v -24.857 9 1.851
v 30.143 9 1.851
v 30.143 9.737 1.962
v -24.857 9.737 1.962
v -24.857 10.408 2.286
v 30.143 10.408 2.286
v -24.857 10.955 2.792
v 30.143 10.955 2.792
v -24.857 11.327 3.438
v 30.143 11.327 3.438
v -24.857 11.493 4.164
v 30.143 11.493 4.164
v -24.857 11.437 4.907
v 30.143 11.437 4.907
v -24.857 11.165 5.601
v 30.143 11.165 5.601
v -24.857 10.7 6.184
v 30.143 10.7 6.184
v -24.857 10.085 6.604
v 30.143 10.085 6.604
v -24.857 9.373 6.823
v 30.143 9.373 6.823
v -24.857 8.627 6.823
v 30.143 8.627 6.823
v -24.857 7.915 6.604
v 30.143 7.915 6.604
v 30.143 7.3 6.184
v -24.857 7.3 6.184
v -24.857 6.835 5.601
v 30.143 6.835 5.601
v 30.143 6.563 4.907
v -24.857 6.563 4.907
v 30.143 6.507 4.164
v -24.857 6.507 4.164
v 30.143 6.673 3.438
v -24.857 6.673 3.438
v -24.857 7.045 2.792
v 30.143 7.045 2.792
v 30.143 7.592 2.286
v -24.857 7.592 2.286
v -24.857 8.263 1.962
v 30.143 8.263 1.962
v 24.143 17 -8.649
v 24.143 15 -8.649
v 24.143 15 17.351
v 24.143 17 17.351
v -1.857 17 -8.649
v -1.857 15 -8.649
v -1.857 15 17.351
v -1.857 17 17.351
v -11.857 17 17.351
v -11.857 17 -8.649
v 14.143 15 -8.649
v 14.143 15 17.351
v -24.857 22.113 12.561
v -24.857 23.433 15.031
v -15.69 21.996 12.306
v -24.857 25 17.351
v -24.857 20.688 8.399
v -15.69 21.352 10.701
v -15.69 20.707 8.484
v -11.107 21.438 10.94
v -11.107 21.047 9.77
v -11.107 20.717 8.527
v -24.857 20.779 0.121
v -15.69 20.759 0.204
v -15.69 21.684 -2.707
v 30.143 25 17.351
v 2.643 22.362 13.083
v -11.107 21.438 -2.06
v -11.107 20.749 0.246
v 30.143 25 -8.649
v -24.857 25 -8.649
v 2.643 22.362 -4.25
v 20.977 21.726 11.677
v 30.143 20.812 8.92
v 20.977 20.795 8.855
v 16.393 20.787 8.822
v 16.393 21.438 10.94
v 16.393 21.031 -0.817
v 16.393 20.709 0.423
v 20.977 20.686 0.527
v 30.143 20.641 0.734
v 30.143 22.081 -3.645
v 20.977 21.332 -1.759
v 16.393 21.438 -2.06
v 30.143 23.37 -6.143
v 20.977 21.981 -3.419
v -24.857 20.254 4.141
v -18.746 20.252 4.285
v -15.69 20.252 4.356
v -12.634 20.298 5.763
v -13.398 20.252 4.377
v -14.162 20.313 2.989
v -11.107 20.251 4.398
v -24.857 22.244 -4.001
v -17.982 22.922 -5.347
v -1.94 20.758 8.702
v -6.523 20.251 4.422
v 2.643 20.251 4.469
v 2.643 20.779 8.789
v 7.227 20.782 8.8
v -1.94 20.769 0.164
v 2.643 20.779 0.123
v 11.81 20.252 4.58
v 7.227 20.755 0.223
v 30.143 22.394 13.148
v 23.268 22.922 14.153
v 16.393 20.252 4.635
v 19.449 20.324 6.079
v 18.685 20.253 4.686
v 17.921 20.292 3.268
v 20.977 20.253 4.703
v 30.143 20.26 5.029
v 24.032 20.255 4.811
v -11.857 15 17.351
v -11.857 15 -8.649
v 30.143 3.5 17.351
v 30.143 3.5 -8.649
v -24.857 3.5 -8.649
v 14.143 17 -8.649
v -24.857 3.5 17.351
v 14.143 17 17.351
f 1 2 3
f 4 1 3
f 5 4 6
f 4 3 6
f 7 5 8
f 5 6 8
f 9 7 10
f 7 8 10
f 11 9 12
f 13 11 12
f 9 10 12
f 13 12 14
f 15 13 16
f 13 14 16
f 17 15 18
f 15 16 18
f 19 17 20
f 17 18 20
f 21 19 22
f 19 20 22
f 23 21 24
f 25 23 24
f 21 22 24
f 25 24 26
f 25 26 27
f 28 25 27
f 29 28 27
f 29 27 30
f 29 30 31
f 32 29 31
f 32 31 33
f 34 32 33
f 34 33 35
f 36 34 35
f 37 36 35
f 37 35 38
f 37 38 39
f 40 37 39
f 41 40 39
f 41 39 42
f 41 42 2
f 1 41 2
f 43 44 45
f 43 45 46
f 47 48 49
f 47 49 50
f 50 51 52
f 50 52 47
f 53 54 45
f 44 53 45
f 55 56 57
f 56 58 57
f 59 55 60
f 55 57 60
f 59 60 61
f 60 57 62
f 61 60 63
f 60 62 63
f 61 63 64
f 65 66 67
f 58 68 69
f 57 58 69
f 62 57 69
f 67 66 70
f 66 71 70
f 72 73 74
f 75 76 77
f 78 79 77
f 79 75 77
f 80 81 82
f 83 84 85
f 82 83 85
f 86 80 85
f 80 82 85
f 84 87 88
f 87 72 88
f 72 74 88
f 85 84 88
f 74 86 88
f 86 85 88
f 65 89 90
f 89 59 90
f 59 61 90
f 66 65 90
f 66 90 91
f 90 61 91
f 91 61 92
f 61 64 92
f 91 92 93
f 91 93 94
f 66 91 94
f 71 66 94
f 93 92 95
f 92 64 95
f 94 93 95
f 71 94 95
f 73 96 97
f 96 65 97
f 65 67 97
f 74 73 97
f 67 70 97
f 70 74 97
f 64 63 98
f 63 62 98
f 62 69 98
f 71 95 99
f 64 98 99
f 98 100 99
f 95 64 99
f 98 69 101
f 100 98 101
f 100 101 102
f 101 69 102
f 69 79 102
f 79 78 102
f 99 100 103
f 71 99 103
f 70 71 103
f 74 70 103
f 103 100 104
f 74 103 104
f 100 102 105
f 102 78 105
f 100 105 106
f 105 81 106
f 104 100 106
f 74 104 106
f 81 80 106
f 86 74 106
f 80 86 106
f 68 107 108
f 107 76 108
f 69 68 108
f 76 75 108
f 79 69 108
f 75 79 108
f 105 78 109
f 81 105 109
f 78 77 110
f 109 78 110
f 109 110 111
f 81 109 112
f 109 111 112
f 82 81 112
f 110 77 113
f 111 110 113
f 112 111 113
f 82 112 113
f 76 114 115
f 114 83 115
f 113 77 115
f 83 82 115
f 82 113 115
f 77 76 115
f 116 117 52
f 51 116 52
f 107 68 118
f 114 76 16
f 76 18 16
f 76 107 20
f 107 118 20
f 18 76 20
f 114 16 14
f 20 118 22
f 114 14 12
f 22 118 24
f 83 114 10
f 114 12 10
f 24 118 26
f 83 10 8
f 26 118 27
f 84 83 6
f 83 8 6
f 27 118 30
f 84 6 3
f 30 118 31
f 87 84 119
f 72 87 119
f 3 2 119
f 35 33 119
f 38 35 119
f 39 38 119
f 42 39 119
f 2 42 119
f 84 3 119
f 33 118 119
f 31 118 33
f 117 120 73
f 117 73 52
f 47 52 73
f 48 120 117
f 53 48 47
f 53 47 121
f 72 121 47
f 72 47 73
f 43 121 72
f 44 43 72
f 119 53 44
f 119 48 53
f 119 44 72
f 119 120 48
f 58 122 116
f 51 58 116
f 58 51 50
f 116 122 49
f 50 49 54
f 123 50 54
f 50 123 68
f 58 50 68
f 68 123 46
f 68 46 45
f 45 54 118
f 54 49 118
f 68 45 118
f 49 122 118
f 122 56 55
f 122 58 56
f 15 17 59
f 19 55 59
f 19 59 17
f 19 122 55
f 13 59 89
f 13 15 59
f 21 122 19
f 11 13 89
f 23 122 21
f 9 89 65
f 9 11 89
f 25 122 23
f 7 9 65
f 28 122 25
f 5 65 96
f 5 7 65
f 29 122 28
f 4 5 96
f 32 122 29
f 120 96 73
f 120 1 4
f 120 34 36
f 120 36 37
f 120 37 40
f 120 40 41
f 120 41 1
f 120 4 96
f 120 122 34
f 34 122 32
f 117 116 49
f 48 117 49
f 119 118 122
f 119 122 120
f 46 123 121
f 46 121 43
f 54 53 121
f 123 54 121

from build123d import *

# Parameters (mm, degrees)
ESQUISSE1_W             = 55
ESQUISSE1_H             = 26
BOSS_EXTRU_1_DEPTH      = 25
ENL_V_MAT_EXTRU_1_REACH = 49.007
ESQUISSE2_W             = 10
ESQUISSE2_H             = 2
ENL_V_MAT_EXTRU_5_REACH = 64.857
ESQUISSE5_R             = 2.5
ESQUISSE5_W             = 26
ESQUISSE5_H             = 3.5


with BuildPart() as part:
    # Esquisse1 → Boss.-Extru.1 (new body)
    with BuildSketch(Plane(origin=(0, 0, 0), x_dir=(1, 0, 0), z_dir=(0, 1, 0))):
        with Locations((2.643338954, -4.351180438)):
            Rectangle(ESQUISSE1_W, ESQUISSE1_H)
    extrude(amount=BOSS_EXTRU_1_DEPTH)

    # Esquisse2 → Enlèv. mat.-Extru.1 (cut, up to next)
    with BuildSketch(Plane.XY.offset(17.351180438), mode=Mode.PRIVATE) as enl_v_mat_extru_1_sk1:
        with Locations((19.143338954, 16)):
            Rectangle(ESQUISSE2_W, ESQUISSE2_H)
    enl_v_mat_extru_1_tool1 = extrude(enl_v_mat_extru_1_sk1.sketch, amount=-ENL_V_MAT_EXTRU_1_REACH, mode=Mode.PRIVATE) & part.part
    # Esquisse2 → Enlèv. mat.-Extru.1 (cut, up to next)
    with BuildSketch(Plane.XY.offset(17.351180438), mode=Mode.PRIVATE) as enl_v_mat_extru_1_sk2:
        with Locations((-6.856661046, 16)):
            Rectangle(ESQUISSE2_W, ESQUISSE2_H)
    enl_v_mat_extru_1_tool2 = extrude(enl_v_mat_extru_1_sk2.sketch, amount=-ENL_V_MAT_EXTRU_1_REACH, mode=Mode.PRIVATE) & part.part
    add(enl_v_mat_extru_1_tool1.solids().sort_by_distance((19.143339, 16, 17.35118))[0], mode=Mode.SUBTRACT)
    add(enl_v_mat_extru_1_tool2.solids().sort_by_distance((-6.856661, 16, 17.35118))[0], mode=Mode.SUBTRACT)

    # Esquisse5 → Enlèv. mat.-Extru.5 (cut, up to next)
    with BuildSketch(Plane(origin=(30.143338954, 0, 0), x_dir=(0, 0, -1), z_dir=(1, 0, 0)), mode=Mode.PRIVATE) as enl_v_mat_extru_5_sk1:
        with Locations((-4.351180438, 9)):
            Circle(ESQUISSE5_R)
    enl_v_mat_extru_5_tool1 = extrude(enl_v_mat_extru_5_sk1.sketch, amount=-ENL_V_MAT_EXTRU_5_REACH, mode=Mode.PRIVATE) & part.part
    # Esquisse5 → Enlèv. mat.-Extru.5 (cut, up to next)
    with BuildSketch(Plane(origin=(30.143338954, 0, 0), x_dir=(0, 0, -1), z_dir=(1, 0, 0)), mode=Mode.PRIVATE) as enl_v_mat_extru_5_sk2:
        with BuildLine():
            Line((-17.351180438, 25), (8.648819562, 25))
            add(Edge.make_bspline(
                [(-17.351180438, 25), (-4.586883511, 15.502643884), (8.648819562, 25)],
                knots=[0, 0, 0, 1, 1, 1], degree=2))
        make_face()
    enl_v_mat_extru_5_tool2 = extrude(enl_v_mat_extru_5_sk2.sketch, amount=-ENL_V_MAT_EXTRU_5_REACH, mode=Mode.PRIVATE) & part.part
    # Esquisse5 → Enlèv. mat.-Extru.5 (cut, up to next)
    with BuildSketch(Plane(origin=(30.143338954, 0, 0), x_dir=(0, 0, -1), z_dir=(1, 0, 0)), mode=Mode.PRIVATE) as enl_v_mat_extru_5_sk3:
        with Locations((-4.351180438, 1.75)):
            Rectangle(ESQUISSE5_W, ESQUISSE5_H)
    enl_v_mat_extru_5_tool3 = extrude(enl_v_mat_extru_5_sk3.sketch, amount=-ENL_V_MAT_EXTRU_5_REACH, mode=Mode.PRIVATE) & part.part
    add(enl_v_mat_extru_5_tool1.solids().sort_by_distance((30.143339, 9, 4.35118))[0], mode=Mode.SUBTRACT)
    add(enl_v_mat_extru_5_tool2.solids().sort_by_distance((30.143339, 23.100529, 4.398321))[0], mode=Mode.SUBTRACT)
    add(enl_v_mat_extru_5_tool3.solids().sort_by_distance((30.143339, 1.75, 4.35118))[0], mode=Mode.SUBTRACT)


solid = part.part
